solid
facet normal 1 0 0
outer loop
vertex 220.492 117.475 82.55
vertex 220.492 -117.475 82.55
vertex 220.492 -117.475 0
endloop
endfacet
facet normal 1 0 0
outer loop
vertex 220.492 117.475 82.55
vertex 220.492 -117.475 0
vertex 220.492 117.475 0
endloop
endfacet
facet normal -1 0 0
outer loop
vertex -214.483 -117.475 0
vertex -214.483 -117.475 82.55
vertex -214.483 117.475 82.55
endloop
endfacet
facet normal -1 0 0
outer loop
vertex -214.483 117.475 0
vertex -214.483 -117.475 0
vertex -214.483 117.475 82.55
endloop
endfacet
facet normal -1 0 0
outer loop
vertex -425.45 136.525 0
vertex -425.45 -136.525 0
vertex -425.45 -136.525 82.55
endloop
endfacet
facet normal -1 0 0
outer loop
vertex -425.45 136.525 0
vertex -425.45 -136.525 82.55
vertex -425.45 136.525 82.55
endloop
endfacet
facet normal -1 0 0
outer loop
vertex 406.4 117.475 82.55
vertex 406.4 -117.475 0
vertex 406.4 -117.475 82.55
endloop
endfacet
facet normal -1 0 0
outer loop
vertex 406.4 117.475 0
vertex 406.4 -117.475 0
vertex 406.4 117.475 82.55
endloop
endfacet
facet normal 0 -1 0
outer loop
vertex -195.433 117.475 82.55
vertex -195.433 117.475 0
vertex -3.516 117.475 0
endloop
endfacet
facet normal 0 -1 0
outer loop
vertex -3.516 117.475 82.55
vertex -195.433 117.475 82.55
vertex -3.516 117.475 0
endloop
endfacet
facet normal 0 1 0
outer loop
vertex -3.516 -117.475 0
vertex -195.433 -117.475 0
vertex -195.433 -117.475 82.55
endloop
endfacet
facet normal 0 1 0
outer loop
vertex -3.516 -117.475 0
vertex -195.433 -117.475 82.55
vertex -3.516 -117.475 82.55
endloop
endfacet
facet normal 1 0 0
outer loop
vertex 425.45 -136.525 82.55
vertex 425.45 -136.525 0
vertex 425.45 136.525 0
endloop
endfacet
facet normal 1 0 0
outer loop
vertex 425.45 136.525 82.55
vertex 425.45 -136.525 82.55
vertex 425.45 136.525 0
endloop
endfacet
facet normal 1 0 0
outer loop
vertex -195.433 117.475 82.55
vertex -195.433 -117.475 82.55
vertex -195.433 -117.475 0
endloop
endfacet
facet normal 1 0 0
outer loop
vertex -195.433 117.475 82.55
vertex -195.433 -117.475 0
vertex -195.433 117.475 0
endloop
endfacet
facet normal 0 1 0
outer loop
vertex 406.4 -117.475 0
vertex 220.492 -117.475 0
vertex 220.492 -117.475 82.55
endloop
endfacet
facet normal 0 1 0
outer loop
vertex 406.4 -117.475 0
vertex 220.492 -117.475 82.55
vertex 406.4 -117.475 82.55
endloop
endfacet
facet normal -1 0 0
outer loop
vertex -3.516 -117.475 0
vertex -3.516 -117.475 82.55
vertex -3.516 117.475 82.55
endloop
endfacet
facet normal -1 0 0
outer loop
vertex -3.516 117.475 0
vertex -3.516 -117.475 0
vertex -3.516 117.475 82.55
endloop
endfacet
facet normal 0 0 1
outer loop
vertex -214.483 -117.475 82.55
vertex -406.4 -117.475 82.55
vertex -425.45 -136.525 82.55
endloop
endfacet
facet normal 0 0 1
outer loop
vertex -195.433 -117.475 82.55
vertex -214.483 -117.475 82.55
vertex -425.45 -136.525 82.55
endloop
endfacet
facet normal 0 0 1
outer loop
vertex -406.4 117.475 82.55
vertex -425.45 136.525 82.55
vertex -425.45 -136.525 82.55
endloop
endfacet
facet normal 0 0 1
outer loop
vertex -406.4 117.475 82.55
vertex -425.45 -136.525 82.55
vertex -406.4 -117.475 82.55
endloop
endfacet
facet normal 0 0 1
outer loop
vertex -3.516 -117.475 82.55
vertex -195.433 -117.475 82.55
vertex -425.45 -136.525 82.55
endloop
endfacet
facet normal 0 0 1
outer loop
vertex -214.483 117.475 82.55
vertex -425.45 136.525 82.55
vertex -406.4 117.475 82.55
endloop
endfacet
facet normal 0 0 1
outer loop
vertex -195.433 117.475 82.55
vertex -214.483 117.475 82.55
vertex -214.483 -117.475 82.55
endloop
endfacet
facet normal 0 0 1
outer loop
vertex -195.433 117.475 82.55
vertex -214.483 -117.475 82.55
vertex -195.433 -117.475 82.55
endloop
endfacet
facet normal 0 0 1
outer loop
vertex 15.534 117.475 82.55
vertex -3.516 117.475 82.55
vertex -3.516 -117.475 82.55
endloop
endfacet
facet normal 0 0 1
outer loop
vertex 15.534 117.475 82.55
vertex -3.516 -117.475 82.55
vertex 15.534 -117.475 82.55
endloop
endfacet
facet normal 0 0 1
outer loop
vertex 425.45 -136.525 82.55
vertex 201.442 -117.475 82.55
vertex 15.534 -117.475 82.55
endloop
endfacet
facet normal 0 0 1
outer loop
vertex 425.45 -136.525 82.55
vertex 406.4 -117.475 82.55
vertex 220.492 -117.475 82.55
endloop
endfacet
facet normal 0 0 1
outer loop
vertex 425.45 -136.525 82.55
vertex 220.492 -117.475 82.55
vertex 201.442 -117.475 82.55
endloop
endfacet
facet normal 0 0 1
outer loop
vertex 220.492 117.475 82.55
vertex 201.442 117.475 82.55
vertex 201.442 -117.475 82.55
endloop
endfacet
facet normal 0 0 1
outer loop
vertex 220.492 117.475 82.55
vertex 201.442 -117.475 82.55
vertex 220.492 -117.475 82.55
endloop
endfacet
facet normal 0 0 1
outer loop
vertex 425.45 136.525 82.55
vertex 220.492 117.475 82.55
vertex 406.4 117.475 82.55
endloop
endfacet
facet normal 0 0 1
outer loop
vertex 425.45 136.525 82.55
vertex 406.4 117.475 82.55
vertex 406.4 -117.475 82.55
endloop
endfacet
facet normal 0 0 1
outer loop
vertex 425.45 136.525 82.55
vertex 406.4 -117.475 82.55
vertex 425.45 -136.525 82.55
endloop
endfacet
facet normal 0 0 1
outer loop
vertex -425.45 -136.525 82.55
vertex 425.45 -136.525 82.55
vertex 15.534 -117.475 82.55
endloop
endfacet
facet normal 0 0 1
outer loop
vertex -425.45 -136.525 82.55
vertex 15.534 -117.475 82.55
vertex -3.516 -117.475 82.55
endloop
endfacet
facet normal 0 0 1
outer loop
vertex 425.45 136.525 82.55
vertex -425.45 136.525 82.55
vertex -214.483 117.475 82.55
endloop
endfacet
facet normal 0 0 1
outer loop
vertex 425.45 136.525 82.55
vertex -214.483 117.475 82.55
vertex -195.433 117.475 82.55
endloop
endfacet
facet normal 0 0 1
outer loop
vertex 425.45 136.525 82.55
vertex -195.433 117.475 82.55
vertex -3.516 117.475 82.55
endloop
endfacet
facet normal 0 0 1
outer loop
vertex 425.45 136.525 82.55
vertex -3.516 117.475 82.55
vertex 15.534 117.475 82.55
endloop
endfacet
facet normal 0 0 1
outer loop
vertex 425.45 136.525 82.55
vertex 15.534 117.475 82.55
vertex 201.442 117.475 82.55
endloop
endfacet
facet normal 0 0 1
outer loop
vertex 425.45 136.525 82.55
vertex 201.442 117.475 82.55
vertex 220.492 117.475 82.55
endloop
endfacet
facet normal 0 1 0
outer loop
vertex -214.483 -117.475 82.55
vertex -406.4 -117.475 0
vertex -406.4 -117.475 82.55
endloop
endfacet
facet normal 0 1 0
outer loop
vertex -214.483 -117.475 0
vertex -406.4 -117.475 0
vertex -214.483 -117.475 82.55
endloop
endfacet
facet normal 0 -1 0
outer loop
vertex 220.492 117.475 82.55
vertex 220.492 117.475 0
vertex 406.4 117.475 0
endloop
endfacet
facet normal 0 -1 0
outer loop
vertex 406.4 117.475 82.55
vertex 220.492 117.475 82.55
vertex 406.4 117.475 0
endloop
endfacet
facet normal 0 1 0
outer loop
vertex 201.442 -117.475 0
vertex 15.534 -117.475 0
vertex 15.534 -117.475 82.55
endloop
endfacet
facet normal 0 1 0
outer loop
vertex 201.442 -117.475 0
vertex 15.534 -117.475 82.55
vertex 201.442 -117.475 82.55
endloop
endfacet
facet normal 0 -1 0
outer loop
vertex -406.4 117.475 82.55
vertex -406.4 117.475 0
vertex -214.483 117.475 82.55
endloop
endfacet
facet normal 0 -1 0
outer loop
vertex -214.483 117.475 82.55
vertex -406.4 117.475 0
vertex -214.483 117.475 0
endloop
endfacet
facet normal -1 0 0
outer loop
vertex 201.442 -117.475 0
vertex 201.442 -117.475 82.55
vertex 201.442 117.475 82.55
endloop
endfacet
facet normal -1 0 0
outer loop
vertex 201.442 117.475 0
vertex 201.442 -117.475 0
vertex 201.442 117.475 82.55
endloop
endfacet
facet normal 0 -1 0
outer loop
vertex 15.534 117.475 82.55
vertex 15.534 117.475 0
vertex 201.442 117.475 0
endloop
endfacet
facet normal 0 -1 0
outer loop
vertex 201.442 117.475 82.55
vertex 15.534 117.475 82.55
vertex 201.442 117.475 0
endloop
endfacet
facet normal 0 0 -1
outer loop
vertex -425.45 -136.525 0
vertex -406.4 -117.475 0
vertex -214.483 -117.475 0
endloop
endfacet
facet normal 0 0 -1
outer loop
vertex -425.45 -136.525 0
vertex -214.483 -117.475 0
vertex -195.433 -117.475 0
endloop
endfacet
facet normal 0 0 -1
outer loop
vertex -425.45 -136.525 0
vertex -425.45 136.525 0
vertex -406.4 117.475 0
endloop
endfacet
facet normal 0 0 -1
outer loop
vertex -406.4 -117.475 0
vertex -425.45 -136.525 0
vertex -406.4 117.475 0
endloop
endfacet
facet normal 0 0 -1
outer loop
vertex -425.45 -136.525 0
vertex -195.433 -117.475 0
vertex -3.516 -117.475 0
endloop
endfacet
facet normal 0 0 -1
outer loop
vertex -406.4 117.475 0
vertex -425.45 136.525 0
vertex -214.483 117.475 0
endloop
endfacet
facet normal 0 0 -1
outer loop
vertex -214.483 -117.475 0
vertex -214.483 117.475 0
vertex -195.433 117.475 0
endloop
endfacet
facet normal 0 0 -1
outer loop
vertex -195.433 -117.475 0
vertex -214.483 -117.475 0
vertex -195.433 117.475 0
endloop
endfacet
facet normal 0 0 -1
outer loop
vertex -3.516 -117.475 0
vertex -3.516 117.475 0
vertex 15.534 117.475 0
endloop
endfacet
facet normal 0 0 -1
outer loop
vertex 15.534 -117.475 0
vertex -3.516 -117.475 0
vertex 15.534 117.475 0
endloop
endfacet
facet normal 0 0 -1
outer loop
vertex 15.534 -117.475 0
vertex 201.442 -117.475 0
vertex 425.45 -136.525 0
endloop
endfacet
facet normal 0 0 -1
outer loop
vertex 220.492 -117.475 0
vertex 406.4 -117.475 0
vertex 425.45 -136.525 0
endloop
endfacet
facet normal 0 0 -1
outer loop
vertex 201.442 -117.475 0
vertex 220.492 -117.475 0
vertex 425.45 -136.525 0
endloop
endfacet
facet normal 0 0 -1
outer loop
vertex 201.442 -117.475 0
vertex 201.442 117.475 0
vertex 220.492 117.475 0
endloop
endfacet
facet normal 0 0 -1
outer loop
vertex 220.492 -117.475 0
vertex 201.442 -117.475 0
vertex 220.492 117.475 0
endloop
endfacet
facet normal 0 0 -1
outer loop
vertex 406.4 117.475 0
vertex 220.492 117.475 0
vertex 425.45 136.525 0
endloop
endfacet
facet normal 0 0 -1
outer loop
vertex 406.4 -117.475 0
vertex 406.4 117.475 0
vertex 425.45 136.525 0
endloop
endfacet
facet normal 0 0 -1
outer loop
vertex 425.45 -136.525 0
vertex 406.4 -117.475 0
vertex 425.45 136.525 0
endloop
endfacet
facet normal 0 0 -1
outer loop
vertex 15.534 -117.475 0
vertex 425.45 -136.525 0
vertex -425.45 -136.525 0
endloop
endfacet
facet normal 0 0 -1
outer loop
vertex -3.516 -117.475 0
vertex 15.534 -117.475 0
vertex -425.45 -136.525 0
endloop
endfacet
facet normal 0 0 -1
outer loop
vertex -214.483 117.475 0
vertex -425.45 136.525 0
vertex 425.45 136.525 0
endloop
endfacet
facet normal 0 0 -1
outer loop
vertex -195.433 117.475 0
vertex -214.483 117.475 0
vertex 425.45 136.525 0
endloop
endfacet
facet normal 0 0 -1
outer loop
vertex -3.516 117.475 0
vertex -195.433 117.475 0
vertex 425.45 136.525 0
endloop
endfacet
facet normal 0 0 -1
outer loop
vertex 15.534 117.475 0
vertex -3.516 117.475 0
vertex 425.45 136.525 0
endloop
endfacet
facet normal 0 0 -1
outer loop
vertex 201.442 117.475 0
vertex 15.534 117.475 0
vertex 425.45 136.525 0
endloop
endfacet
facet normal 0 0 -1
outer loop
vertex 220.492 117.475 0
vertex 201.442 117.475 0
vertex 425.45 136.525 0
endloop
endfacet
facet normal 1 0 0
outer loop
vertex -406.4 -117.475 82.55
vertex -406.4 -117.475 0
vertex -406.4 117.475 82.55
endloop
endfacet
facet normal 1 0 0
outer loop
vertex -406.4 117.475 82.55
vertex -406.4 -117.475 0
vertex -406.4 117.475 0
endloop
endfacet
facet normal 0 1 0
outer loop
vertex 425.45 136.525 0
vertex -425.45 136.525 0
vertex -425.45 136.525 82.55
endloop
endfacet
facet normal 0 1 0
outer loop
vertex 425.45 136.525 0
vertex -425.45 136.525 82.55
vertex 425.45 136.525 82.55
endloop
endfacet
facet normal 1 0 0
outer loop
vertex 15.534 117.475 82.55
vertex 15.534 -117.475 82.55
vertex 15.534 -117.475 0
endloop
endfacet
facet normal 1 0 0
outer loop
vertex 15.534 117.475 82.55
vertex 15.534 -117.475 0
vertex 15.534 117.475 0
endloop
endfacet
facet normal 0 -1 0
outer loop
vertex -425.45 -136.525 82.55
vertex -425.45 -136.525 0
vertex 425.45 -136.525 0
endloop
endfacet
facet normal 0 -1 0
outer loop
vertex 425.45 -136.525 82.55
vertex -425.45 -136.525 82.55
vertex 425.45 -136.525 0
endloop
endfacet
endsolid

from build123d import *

# Parameters (mm, degrees)
F1_W     = 850.9
F1_H     = 273.05
F1_W_2   = 812.8
F1_H_2   = 234.95
F2_DEPTH = 82.55
F3_W     = 19.05
F3_H     = 234.95
F4_DEPTH = 82.55
F5_W     = 19.05
F5_H     = 234.95
F6_DEPTH = 82.55
F7_W     = 19.05
F7_H     = 234.95
F8_DEPTH = 82.55


with BuildPart() as f2:
    # F1 (on face) → F2 (new body)
    with BuildSketch(Plane.XY):
        Rectangle(F1_W, F1_H)
        Rectangle(F1_W_2, F1_H_2, mode=Mode.SUBTRACT)
    extrude(amount=F2_DEPTH)

    # F3 (on face) → F4 (join)
    with BuildSketch(Plane.XY.offset(82.55)):
        with Locations((6.0091395862, 0)):
            Rectangle(F3_W, F3_H)
    extrude(amount=-F4_DEPTH)

    # F5 (on face) → F6 (join)
    with BuildSketch(Plane.XY.offset(82.55)):
        with Locations((-204.9579302069, 0)):
            Rectangle(F5_W, F5_H)
    extrude(amount=-F6_DEPTH)

    # F7 (on face) → F8 (join)
    with BuildSketch(Plane.XY.offset(82.55)):
        with Locations((210.9670697931, 0)):
            Rectangle(F7_W, F7_H)
    extrude(amount=-F8_DEPTH)


solid = f2.part
